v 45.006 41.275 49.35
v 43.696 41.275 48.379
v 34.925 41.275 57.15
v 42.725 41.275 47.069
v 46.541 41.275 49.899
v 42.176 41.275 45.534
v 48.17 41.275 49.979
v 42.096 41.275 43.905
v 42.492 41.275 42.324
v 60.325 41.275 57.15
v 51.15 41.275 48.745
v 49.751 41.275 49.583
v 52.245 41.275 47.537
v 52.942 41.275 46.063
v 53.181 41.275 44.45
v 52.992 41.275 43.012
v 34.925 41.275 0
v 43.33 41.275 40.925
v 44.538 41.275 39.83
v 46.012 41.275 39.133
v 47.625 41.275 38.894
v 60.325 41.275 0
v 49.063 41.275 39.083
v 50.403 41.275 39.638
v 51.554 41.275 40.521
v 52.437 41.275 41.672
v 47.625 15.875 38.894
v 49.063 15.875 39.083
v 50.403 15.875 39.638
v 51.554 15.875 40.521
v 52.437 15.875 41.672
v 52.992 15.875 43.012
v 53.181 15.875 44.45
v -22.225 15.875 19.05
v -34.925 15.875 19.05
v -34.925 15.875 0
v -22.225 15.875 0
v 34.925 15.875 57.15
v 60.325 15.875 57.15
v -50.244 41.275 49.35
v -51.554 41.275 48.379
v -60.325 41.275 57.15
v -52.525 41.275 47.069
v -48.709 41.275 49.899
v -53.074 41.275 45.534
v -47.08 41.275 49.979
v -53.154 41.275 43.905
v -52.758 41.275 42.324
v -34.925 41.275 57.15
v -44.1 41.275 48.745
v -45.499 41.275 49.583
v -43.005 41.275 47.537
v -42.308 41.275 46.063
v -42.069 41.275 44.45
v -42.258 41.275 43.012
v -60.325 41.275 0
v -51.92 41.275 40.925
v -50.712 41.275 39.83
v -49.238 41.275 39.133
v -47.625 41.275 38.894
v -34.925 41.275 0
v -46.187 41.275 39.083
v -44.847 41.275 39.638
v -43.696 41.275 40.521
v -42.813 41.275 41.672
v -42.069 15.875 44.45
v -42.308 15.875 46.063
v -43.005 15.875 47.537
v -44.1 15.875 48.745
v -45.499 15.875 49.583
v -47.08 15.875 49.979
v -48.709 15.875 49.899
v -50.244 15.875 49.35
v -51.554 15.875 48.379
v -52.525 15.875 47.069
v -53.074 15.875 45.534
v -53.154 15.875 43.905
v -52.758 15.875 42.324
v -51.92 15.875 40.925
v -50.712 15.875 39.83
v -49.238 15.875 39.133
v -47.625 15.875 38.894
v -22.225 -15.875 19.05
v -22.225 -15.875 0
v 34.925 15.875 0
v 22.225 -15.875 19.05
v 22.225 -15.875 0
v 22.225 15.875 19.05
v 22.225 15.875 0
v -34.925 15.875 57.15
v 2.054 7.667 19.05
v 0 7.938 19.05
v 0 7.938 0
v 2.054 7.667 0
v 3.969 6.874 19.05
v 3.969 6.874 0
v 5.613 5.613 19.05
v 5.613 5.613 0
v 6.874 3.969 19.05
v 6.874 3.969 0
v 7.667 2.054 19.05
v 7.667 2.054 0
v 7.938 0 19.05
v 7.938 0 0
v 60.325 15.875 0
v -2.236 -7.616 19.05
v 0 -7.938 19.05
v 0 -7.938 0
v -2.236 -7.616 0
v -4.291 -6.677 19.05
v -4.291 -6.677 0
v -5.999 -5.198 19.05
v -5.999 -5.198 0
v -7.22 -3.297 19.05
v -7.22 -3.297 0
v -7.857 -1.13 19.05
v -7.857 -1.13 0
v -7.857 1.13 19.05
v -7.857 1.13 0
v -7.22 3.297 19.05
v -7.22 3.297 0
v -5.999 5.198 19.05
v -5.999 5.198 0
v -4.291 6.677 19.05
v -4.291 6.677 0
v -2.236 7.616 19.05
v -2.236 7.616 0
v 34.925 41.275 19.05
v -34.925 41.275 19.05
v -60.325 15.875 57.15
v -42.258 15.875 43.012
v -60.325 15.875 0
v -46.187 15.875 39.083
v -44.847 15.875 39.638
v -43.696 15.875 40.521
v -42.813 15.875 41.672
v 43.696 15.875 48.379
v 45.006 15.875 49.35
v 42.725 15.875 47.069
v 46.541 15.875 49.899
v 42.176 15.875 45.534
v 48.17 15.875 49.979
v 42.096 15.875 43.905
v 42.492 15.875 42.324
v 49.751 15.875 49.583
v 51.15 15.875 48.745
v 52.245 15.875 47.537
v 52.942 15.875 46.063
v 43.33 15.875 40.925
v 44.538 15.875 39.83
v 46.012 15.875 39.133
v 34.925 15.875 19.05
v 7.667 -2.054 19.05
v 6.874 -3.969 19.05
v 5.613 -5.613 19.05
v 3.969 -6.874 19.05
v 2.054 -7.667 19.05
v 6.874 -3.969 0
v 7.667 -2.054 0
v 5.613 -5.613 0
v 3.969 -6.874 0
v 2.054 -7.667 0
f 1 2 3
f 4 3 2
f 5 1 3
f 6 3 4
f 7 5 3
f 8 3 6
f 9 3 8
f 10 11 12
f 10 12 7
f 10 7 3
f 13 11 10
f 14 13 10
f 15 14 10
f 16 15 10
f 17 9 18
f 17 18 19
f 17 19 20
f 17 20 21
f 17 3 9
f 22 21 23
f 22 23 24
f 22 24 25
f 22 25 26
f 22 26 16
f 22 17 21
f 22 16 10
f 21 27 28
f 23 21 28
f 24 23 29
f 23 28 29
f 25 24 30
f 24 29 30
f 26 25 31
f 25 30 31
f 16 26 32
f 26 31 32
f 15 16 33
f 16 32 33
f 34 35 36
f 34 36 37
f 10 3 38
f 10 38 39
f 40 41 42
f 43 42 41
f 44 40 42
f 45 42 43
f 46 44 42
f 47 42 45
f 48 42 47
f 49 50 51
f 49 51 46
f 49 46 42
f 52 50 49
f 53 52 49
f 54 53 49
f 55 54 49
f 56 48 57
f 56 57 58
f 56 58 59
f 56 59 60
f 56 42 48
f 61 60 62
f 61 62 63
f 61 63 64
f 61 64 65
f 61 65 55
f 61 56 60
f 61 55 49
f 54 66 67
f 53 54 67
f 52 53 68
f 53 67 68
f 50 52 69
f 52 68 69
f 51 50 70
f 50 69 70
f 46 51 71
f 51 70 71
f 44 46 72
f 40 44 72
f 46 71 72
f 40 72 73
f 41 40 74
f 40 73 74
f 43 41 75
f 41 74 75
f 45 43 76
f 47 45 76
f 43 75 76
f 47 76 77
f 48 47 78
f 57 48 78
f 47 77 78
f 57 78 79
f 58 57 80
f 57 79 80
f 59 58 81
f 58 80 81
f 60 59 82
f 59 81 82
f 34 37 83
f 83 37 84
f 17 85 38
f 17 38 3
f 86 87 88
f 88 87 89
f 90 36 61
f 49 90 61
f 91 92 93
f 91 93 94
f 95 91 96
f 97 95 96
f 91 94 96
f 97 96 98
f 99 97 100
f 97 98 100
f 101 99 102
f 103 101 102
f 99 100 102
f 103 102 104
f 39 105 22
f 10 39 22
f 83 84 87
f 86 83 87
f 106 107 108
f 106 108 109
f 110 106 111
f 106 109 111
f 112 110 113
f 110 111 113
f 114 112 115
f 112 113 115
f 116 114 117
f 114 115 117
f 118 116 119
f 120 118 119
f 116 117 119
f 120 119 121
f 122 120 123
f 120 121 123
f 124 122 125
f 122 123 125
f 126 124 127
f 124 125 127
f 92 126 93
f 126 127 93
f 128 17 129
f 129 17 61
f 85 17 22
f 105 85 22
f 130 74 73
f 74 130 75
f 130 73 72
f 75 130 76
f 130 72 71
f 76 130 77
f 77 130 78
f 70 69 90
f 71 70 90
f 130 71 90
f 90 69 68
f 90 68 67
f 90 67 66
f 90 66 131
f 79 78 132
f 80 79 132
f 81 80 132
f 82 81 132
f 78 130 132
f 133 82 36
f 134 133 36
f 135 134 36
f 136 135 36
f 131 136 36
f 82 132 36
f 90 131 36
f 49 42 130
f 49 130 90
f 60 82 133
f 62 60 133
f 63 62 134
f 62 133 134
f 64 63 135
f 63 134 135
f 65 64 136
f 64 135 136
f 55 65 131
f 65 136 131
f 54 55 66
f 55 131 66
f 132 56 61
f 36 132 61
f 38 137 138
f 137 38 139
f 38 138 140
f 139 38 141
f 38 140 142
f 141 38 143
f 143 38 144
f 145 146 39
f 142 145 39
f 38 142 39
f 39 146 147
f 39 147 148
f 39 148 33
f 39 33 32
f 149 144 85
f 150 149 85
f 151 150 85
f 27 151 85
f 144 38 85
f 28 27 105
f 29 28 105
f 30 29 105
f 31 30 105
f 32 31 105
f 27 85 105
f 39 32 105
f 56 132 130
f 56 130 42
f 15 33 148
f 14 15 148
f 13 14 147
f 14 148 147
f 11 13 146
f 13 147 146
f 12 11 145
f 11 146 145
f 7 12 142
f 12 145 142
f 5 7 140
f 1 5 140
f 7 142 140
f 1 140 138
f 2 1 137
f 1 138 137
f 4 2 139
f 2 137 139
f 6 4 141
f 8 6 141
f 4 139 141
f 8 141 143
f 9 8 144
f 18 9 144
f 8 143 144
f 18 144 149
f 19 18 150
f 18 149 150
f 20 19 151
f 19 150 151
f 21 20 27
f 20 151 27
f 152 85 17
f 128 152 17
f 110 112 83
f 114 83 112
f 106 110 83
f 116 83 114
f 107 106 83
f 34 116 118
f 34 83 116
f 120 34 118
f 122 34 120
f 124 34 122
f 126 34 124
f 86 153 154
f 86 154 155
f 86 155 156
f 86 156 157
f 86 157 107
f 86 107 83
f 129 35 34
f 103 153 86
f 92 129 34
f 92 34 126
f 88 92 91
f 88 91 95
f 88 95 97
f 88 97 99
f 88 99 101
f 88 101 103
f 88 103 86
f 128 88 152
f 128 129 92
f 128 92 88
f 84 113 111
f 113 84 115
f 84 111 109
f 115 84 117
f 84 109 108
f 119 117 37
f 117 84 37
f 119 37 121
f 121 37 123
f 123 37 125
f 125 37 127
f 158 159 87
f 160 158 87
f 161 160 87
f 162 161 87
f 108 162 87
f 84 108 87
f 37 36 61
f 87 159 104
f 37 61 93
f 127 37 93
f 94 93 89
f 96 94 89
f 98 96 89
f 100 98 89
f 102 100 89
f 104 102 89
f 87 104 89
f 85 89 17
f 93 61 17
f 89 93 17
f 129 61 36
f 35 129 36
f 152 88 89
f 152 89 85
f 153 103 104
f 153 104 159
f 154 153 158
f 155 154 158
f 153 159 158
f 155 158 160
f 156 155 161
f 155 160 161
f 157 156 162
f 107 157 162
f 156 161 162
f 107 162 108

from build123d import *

# Parameters (mm, degrees)
F0_W     = 25.4
F0_H     = 25.4
F1_DEPTH = 57.15
F2_DEPTH = 57.15
F3_DEPTH = 19.05
F5_DEPTH = 49.022
F6_DEPTH = 48.768


with BuildPart() as f1:
    # F0 (on Top) → F1 (new body)
    with BuildSketch(Plane.XY):
        with Locations((-47.625, 28.575)):
            Rectangle(F0_W, F0_H)
    extrude(amount=F1_DEPTH)


with BuildPart() as f2:
    # F0 (on Top) → F2 (new body)
    with BuildSketch(Plane.XY):
        with Locations((47.625, 28.575)):
            Rectangle(F0_W, F0_H)
    extrude(amount=F2_DEPTH)


with BuildPart() as f3:
    # F0 (on Top) → F3 (new body)
    with BuildSketch(Plane.XY):
        with BuildLine():
            ThreePointArc((0, -7.9375), (-7.9375, 0), (0, 7.9375))
            Line((0, 7.9375), (0, 15.875))
            Line((0, 15.875), (0, 41.275))
            Line((0, 41.275), (-34.925, 41.275))
            Line((-34.925, 41.275), (-34.925, 15.875))
            Line((-34.925, 15.875), (-22.225, 15.875))
            Line((-22.225, 15.875), (-22.225, -15.875))
            Line((-22.225, -15.875), (0, -15.875))
            Line((0, -15.875), (0, -7.9375))
        make_face()
        with BuildLine():
            ThreePointArc((0, 7.9375), (5.6126600757, 5.6126600757), (7.9375, 0))
            ThreePointArc((7.9375, 0), (5.6126600757, -5.6126600757), (0, -7.9375))
            Line((0, -7.9375), (0, -15.875))
            Line((0, -15.875), (22.225, -15.875))
            Line((22.225, -15.875), (22.225, 15.875))
            Line((22.225, 15.875), (34.925, 15.875))
            Line((34.925, 15.875), (34.925, 41.275))
            Line((34.925, 41.275), (0, 41.275))
            Line((0, 41.275), (0, 15.875))
            Line((0, 15.875), (0, 7.9375))
        make_face()
    extrude(amount=F3_DEPTH)


with BuildPart() as f5_tool:
    # F4 (on Front) → F5 (new body)
    with BuildSketch(Plane.XZ):
        with BuildLine():
            ThreePointArc((-42.06875, 44.45), (-51.553862053, 48.378862053), (-47.625, 38.89375))
            ThreePointArc((-47.625, 38.89375), (-43.696137947, 40.521137947), (-42.06875, 44.45))
        make_face()
        with BuildLine():
            ThreePointArc((53.18125, 44.45), (43.696137947, 48.378862053), (47.625, 38.89375))
            ThreePointArc((47.625, 38.89375), (51.553862053, 40.521137947), (53.18125, 44.45))
        make_face()
    extrude(amount=-F5_DEPTH)


with BuildPart() as f1_1:
    add(f1.part)

    # F5: cut by f5_tool
    add(f5_tool.part, mode=Mode.SUBTRACT)

    # F4 (on Front) → F6 (cut)
    with BuildSketch(Plane.XZ):
        with BuildLine():
            ThreePointArc((-42.06875, 44.45), (-51.553862053, 48.378862053), (-47.625, 38.89375))
            ThreePointArc((-47.625, 38.89375), (-43.696137947, 40.521137947), (-42.06875, 44.45))
        make_face()
        with BuildLine():
            ThreePointArc((53.18125, 44.45), (43.696137947, 48.378862053), (47.625, 38.89375))
            ThreePointArc((47.625, 38.89375), (51.553862053, 40.521137947), (53.18125, 44.45))
        make_face()
    extrude(amount=-F6_DEPTH, mode=Mode.SUBTRACT)


with BuildPart() as f2_1:
    add(f2.part)

    # F5: cut by f5_tool
    add(f5_tool.part, mode=Mode.SUBTRACT)


solid = Compound([f3.part, f1_1.part, f2_1.part])
